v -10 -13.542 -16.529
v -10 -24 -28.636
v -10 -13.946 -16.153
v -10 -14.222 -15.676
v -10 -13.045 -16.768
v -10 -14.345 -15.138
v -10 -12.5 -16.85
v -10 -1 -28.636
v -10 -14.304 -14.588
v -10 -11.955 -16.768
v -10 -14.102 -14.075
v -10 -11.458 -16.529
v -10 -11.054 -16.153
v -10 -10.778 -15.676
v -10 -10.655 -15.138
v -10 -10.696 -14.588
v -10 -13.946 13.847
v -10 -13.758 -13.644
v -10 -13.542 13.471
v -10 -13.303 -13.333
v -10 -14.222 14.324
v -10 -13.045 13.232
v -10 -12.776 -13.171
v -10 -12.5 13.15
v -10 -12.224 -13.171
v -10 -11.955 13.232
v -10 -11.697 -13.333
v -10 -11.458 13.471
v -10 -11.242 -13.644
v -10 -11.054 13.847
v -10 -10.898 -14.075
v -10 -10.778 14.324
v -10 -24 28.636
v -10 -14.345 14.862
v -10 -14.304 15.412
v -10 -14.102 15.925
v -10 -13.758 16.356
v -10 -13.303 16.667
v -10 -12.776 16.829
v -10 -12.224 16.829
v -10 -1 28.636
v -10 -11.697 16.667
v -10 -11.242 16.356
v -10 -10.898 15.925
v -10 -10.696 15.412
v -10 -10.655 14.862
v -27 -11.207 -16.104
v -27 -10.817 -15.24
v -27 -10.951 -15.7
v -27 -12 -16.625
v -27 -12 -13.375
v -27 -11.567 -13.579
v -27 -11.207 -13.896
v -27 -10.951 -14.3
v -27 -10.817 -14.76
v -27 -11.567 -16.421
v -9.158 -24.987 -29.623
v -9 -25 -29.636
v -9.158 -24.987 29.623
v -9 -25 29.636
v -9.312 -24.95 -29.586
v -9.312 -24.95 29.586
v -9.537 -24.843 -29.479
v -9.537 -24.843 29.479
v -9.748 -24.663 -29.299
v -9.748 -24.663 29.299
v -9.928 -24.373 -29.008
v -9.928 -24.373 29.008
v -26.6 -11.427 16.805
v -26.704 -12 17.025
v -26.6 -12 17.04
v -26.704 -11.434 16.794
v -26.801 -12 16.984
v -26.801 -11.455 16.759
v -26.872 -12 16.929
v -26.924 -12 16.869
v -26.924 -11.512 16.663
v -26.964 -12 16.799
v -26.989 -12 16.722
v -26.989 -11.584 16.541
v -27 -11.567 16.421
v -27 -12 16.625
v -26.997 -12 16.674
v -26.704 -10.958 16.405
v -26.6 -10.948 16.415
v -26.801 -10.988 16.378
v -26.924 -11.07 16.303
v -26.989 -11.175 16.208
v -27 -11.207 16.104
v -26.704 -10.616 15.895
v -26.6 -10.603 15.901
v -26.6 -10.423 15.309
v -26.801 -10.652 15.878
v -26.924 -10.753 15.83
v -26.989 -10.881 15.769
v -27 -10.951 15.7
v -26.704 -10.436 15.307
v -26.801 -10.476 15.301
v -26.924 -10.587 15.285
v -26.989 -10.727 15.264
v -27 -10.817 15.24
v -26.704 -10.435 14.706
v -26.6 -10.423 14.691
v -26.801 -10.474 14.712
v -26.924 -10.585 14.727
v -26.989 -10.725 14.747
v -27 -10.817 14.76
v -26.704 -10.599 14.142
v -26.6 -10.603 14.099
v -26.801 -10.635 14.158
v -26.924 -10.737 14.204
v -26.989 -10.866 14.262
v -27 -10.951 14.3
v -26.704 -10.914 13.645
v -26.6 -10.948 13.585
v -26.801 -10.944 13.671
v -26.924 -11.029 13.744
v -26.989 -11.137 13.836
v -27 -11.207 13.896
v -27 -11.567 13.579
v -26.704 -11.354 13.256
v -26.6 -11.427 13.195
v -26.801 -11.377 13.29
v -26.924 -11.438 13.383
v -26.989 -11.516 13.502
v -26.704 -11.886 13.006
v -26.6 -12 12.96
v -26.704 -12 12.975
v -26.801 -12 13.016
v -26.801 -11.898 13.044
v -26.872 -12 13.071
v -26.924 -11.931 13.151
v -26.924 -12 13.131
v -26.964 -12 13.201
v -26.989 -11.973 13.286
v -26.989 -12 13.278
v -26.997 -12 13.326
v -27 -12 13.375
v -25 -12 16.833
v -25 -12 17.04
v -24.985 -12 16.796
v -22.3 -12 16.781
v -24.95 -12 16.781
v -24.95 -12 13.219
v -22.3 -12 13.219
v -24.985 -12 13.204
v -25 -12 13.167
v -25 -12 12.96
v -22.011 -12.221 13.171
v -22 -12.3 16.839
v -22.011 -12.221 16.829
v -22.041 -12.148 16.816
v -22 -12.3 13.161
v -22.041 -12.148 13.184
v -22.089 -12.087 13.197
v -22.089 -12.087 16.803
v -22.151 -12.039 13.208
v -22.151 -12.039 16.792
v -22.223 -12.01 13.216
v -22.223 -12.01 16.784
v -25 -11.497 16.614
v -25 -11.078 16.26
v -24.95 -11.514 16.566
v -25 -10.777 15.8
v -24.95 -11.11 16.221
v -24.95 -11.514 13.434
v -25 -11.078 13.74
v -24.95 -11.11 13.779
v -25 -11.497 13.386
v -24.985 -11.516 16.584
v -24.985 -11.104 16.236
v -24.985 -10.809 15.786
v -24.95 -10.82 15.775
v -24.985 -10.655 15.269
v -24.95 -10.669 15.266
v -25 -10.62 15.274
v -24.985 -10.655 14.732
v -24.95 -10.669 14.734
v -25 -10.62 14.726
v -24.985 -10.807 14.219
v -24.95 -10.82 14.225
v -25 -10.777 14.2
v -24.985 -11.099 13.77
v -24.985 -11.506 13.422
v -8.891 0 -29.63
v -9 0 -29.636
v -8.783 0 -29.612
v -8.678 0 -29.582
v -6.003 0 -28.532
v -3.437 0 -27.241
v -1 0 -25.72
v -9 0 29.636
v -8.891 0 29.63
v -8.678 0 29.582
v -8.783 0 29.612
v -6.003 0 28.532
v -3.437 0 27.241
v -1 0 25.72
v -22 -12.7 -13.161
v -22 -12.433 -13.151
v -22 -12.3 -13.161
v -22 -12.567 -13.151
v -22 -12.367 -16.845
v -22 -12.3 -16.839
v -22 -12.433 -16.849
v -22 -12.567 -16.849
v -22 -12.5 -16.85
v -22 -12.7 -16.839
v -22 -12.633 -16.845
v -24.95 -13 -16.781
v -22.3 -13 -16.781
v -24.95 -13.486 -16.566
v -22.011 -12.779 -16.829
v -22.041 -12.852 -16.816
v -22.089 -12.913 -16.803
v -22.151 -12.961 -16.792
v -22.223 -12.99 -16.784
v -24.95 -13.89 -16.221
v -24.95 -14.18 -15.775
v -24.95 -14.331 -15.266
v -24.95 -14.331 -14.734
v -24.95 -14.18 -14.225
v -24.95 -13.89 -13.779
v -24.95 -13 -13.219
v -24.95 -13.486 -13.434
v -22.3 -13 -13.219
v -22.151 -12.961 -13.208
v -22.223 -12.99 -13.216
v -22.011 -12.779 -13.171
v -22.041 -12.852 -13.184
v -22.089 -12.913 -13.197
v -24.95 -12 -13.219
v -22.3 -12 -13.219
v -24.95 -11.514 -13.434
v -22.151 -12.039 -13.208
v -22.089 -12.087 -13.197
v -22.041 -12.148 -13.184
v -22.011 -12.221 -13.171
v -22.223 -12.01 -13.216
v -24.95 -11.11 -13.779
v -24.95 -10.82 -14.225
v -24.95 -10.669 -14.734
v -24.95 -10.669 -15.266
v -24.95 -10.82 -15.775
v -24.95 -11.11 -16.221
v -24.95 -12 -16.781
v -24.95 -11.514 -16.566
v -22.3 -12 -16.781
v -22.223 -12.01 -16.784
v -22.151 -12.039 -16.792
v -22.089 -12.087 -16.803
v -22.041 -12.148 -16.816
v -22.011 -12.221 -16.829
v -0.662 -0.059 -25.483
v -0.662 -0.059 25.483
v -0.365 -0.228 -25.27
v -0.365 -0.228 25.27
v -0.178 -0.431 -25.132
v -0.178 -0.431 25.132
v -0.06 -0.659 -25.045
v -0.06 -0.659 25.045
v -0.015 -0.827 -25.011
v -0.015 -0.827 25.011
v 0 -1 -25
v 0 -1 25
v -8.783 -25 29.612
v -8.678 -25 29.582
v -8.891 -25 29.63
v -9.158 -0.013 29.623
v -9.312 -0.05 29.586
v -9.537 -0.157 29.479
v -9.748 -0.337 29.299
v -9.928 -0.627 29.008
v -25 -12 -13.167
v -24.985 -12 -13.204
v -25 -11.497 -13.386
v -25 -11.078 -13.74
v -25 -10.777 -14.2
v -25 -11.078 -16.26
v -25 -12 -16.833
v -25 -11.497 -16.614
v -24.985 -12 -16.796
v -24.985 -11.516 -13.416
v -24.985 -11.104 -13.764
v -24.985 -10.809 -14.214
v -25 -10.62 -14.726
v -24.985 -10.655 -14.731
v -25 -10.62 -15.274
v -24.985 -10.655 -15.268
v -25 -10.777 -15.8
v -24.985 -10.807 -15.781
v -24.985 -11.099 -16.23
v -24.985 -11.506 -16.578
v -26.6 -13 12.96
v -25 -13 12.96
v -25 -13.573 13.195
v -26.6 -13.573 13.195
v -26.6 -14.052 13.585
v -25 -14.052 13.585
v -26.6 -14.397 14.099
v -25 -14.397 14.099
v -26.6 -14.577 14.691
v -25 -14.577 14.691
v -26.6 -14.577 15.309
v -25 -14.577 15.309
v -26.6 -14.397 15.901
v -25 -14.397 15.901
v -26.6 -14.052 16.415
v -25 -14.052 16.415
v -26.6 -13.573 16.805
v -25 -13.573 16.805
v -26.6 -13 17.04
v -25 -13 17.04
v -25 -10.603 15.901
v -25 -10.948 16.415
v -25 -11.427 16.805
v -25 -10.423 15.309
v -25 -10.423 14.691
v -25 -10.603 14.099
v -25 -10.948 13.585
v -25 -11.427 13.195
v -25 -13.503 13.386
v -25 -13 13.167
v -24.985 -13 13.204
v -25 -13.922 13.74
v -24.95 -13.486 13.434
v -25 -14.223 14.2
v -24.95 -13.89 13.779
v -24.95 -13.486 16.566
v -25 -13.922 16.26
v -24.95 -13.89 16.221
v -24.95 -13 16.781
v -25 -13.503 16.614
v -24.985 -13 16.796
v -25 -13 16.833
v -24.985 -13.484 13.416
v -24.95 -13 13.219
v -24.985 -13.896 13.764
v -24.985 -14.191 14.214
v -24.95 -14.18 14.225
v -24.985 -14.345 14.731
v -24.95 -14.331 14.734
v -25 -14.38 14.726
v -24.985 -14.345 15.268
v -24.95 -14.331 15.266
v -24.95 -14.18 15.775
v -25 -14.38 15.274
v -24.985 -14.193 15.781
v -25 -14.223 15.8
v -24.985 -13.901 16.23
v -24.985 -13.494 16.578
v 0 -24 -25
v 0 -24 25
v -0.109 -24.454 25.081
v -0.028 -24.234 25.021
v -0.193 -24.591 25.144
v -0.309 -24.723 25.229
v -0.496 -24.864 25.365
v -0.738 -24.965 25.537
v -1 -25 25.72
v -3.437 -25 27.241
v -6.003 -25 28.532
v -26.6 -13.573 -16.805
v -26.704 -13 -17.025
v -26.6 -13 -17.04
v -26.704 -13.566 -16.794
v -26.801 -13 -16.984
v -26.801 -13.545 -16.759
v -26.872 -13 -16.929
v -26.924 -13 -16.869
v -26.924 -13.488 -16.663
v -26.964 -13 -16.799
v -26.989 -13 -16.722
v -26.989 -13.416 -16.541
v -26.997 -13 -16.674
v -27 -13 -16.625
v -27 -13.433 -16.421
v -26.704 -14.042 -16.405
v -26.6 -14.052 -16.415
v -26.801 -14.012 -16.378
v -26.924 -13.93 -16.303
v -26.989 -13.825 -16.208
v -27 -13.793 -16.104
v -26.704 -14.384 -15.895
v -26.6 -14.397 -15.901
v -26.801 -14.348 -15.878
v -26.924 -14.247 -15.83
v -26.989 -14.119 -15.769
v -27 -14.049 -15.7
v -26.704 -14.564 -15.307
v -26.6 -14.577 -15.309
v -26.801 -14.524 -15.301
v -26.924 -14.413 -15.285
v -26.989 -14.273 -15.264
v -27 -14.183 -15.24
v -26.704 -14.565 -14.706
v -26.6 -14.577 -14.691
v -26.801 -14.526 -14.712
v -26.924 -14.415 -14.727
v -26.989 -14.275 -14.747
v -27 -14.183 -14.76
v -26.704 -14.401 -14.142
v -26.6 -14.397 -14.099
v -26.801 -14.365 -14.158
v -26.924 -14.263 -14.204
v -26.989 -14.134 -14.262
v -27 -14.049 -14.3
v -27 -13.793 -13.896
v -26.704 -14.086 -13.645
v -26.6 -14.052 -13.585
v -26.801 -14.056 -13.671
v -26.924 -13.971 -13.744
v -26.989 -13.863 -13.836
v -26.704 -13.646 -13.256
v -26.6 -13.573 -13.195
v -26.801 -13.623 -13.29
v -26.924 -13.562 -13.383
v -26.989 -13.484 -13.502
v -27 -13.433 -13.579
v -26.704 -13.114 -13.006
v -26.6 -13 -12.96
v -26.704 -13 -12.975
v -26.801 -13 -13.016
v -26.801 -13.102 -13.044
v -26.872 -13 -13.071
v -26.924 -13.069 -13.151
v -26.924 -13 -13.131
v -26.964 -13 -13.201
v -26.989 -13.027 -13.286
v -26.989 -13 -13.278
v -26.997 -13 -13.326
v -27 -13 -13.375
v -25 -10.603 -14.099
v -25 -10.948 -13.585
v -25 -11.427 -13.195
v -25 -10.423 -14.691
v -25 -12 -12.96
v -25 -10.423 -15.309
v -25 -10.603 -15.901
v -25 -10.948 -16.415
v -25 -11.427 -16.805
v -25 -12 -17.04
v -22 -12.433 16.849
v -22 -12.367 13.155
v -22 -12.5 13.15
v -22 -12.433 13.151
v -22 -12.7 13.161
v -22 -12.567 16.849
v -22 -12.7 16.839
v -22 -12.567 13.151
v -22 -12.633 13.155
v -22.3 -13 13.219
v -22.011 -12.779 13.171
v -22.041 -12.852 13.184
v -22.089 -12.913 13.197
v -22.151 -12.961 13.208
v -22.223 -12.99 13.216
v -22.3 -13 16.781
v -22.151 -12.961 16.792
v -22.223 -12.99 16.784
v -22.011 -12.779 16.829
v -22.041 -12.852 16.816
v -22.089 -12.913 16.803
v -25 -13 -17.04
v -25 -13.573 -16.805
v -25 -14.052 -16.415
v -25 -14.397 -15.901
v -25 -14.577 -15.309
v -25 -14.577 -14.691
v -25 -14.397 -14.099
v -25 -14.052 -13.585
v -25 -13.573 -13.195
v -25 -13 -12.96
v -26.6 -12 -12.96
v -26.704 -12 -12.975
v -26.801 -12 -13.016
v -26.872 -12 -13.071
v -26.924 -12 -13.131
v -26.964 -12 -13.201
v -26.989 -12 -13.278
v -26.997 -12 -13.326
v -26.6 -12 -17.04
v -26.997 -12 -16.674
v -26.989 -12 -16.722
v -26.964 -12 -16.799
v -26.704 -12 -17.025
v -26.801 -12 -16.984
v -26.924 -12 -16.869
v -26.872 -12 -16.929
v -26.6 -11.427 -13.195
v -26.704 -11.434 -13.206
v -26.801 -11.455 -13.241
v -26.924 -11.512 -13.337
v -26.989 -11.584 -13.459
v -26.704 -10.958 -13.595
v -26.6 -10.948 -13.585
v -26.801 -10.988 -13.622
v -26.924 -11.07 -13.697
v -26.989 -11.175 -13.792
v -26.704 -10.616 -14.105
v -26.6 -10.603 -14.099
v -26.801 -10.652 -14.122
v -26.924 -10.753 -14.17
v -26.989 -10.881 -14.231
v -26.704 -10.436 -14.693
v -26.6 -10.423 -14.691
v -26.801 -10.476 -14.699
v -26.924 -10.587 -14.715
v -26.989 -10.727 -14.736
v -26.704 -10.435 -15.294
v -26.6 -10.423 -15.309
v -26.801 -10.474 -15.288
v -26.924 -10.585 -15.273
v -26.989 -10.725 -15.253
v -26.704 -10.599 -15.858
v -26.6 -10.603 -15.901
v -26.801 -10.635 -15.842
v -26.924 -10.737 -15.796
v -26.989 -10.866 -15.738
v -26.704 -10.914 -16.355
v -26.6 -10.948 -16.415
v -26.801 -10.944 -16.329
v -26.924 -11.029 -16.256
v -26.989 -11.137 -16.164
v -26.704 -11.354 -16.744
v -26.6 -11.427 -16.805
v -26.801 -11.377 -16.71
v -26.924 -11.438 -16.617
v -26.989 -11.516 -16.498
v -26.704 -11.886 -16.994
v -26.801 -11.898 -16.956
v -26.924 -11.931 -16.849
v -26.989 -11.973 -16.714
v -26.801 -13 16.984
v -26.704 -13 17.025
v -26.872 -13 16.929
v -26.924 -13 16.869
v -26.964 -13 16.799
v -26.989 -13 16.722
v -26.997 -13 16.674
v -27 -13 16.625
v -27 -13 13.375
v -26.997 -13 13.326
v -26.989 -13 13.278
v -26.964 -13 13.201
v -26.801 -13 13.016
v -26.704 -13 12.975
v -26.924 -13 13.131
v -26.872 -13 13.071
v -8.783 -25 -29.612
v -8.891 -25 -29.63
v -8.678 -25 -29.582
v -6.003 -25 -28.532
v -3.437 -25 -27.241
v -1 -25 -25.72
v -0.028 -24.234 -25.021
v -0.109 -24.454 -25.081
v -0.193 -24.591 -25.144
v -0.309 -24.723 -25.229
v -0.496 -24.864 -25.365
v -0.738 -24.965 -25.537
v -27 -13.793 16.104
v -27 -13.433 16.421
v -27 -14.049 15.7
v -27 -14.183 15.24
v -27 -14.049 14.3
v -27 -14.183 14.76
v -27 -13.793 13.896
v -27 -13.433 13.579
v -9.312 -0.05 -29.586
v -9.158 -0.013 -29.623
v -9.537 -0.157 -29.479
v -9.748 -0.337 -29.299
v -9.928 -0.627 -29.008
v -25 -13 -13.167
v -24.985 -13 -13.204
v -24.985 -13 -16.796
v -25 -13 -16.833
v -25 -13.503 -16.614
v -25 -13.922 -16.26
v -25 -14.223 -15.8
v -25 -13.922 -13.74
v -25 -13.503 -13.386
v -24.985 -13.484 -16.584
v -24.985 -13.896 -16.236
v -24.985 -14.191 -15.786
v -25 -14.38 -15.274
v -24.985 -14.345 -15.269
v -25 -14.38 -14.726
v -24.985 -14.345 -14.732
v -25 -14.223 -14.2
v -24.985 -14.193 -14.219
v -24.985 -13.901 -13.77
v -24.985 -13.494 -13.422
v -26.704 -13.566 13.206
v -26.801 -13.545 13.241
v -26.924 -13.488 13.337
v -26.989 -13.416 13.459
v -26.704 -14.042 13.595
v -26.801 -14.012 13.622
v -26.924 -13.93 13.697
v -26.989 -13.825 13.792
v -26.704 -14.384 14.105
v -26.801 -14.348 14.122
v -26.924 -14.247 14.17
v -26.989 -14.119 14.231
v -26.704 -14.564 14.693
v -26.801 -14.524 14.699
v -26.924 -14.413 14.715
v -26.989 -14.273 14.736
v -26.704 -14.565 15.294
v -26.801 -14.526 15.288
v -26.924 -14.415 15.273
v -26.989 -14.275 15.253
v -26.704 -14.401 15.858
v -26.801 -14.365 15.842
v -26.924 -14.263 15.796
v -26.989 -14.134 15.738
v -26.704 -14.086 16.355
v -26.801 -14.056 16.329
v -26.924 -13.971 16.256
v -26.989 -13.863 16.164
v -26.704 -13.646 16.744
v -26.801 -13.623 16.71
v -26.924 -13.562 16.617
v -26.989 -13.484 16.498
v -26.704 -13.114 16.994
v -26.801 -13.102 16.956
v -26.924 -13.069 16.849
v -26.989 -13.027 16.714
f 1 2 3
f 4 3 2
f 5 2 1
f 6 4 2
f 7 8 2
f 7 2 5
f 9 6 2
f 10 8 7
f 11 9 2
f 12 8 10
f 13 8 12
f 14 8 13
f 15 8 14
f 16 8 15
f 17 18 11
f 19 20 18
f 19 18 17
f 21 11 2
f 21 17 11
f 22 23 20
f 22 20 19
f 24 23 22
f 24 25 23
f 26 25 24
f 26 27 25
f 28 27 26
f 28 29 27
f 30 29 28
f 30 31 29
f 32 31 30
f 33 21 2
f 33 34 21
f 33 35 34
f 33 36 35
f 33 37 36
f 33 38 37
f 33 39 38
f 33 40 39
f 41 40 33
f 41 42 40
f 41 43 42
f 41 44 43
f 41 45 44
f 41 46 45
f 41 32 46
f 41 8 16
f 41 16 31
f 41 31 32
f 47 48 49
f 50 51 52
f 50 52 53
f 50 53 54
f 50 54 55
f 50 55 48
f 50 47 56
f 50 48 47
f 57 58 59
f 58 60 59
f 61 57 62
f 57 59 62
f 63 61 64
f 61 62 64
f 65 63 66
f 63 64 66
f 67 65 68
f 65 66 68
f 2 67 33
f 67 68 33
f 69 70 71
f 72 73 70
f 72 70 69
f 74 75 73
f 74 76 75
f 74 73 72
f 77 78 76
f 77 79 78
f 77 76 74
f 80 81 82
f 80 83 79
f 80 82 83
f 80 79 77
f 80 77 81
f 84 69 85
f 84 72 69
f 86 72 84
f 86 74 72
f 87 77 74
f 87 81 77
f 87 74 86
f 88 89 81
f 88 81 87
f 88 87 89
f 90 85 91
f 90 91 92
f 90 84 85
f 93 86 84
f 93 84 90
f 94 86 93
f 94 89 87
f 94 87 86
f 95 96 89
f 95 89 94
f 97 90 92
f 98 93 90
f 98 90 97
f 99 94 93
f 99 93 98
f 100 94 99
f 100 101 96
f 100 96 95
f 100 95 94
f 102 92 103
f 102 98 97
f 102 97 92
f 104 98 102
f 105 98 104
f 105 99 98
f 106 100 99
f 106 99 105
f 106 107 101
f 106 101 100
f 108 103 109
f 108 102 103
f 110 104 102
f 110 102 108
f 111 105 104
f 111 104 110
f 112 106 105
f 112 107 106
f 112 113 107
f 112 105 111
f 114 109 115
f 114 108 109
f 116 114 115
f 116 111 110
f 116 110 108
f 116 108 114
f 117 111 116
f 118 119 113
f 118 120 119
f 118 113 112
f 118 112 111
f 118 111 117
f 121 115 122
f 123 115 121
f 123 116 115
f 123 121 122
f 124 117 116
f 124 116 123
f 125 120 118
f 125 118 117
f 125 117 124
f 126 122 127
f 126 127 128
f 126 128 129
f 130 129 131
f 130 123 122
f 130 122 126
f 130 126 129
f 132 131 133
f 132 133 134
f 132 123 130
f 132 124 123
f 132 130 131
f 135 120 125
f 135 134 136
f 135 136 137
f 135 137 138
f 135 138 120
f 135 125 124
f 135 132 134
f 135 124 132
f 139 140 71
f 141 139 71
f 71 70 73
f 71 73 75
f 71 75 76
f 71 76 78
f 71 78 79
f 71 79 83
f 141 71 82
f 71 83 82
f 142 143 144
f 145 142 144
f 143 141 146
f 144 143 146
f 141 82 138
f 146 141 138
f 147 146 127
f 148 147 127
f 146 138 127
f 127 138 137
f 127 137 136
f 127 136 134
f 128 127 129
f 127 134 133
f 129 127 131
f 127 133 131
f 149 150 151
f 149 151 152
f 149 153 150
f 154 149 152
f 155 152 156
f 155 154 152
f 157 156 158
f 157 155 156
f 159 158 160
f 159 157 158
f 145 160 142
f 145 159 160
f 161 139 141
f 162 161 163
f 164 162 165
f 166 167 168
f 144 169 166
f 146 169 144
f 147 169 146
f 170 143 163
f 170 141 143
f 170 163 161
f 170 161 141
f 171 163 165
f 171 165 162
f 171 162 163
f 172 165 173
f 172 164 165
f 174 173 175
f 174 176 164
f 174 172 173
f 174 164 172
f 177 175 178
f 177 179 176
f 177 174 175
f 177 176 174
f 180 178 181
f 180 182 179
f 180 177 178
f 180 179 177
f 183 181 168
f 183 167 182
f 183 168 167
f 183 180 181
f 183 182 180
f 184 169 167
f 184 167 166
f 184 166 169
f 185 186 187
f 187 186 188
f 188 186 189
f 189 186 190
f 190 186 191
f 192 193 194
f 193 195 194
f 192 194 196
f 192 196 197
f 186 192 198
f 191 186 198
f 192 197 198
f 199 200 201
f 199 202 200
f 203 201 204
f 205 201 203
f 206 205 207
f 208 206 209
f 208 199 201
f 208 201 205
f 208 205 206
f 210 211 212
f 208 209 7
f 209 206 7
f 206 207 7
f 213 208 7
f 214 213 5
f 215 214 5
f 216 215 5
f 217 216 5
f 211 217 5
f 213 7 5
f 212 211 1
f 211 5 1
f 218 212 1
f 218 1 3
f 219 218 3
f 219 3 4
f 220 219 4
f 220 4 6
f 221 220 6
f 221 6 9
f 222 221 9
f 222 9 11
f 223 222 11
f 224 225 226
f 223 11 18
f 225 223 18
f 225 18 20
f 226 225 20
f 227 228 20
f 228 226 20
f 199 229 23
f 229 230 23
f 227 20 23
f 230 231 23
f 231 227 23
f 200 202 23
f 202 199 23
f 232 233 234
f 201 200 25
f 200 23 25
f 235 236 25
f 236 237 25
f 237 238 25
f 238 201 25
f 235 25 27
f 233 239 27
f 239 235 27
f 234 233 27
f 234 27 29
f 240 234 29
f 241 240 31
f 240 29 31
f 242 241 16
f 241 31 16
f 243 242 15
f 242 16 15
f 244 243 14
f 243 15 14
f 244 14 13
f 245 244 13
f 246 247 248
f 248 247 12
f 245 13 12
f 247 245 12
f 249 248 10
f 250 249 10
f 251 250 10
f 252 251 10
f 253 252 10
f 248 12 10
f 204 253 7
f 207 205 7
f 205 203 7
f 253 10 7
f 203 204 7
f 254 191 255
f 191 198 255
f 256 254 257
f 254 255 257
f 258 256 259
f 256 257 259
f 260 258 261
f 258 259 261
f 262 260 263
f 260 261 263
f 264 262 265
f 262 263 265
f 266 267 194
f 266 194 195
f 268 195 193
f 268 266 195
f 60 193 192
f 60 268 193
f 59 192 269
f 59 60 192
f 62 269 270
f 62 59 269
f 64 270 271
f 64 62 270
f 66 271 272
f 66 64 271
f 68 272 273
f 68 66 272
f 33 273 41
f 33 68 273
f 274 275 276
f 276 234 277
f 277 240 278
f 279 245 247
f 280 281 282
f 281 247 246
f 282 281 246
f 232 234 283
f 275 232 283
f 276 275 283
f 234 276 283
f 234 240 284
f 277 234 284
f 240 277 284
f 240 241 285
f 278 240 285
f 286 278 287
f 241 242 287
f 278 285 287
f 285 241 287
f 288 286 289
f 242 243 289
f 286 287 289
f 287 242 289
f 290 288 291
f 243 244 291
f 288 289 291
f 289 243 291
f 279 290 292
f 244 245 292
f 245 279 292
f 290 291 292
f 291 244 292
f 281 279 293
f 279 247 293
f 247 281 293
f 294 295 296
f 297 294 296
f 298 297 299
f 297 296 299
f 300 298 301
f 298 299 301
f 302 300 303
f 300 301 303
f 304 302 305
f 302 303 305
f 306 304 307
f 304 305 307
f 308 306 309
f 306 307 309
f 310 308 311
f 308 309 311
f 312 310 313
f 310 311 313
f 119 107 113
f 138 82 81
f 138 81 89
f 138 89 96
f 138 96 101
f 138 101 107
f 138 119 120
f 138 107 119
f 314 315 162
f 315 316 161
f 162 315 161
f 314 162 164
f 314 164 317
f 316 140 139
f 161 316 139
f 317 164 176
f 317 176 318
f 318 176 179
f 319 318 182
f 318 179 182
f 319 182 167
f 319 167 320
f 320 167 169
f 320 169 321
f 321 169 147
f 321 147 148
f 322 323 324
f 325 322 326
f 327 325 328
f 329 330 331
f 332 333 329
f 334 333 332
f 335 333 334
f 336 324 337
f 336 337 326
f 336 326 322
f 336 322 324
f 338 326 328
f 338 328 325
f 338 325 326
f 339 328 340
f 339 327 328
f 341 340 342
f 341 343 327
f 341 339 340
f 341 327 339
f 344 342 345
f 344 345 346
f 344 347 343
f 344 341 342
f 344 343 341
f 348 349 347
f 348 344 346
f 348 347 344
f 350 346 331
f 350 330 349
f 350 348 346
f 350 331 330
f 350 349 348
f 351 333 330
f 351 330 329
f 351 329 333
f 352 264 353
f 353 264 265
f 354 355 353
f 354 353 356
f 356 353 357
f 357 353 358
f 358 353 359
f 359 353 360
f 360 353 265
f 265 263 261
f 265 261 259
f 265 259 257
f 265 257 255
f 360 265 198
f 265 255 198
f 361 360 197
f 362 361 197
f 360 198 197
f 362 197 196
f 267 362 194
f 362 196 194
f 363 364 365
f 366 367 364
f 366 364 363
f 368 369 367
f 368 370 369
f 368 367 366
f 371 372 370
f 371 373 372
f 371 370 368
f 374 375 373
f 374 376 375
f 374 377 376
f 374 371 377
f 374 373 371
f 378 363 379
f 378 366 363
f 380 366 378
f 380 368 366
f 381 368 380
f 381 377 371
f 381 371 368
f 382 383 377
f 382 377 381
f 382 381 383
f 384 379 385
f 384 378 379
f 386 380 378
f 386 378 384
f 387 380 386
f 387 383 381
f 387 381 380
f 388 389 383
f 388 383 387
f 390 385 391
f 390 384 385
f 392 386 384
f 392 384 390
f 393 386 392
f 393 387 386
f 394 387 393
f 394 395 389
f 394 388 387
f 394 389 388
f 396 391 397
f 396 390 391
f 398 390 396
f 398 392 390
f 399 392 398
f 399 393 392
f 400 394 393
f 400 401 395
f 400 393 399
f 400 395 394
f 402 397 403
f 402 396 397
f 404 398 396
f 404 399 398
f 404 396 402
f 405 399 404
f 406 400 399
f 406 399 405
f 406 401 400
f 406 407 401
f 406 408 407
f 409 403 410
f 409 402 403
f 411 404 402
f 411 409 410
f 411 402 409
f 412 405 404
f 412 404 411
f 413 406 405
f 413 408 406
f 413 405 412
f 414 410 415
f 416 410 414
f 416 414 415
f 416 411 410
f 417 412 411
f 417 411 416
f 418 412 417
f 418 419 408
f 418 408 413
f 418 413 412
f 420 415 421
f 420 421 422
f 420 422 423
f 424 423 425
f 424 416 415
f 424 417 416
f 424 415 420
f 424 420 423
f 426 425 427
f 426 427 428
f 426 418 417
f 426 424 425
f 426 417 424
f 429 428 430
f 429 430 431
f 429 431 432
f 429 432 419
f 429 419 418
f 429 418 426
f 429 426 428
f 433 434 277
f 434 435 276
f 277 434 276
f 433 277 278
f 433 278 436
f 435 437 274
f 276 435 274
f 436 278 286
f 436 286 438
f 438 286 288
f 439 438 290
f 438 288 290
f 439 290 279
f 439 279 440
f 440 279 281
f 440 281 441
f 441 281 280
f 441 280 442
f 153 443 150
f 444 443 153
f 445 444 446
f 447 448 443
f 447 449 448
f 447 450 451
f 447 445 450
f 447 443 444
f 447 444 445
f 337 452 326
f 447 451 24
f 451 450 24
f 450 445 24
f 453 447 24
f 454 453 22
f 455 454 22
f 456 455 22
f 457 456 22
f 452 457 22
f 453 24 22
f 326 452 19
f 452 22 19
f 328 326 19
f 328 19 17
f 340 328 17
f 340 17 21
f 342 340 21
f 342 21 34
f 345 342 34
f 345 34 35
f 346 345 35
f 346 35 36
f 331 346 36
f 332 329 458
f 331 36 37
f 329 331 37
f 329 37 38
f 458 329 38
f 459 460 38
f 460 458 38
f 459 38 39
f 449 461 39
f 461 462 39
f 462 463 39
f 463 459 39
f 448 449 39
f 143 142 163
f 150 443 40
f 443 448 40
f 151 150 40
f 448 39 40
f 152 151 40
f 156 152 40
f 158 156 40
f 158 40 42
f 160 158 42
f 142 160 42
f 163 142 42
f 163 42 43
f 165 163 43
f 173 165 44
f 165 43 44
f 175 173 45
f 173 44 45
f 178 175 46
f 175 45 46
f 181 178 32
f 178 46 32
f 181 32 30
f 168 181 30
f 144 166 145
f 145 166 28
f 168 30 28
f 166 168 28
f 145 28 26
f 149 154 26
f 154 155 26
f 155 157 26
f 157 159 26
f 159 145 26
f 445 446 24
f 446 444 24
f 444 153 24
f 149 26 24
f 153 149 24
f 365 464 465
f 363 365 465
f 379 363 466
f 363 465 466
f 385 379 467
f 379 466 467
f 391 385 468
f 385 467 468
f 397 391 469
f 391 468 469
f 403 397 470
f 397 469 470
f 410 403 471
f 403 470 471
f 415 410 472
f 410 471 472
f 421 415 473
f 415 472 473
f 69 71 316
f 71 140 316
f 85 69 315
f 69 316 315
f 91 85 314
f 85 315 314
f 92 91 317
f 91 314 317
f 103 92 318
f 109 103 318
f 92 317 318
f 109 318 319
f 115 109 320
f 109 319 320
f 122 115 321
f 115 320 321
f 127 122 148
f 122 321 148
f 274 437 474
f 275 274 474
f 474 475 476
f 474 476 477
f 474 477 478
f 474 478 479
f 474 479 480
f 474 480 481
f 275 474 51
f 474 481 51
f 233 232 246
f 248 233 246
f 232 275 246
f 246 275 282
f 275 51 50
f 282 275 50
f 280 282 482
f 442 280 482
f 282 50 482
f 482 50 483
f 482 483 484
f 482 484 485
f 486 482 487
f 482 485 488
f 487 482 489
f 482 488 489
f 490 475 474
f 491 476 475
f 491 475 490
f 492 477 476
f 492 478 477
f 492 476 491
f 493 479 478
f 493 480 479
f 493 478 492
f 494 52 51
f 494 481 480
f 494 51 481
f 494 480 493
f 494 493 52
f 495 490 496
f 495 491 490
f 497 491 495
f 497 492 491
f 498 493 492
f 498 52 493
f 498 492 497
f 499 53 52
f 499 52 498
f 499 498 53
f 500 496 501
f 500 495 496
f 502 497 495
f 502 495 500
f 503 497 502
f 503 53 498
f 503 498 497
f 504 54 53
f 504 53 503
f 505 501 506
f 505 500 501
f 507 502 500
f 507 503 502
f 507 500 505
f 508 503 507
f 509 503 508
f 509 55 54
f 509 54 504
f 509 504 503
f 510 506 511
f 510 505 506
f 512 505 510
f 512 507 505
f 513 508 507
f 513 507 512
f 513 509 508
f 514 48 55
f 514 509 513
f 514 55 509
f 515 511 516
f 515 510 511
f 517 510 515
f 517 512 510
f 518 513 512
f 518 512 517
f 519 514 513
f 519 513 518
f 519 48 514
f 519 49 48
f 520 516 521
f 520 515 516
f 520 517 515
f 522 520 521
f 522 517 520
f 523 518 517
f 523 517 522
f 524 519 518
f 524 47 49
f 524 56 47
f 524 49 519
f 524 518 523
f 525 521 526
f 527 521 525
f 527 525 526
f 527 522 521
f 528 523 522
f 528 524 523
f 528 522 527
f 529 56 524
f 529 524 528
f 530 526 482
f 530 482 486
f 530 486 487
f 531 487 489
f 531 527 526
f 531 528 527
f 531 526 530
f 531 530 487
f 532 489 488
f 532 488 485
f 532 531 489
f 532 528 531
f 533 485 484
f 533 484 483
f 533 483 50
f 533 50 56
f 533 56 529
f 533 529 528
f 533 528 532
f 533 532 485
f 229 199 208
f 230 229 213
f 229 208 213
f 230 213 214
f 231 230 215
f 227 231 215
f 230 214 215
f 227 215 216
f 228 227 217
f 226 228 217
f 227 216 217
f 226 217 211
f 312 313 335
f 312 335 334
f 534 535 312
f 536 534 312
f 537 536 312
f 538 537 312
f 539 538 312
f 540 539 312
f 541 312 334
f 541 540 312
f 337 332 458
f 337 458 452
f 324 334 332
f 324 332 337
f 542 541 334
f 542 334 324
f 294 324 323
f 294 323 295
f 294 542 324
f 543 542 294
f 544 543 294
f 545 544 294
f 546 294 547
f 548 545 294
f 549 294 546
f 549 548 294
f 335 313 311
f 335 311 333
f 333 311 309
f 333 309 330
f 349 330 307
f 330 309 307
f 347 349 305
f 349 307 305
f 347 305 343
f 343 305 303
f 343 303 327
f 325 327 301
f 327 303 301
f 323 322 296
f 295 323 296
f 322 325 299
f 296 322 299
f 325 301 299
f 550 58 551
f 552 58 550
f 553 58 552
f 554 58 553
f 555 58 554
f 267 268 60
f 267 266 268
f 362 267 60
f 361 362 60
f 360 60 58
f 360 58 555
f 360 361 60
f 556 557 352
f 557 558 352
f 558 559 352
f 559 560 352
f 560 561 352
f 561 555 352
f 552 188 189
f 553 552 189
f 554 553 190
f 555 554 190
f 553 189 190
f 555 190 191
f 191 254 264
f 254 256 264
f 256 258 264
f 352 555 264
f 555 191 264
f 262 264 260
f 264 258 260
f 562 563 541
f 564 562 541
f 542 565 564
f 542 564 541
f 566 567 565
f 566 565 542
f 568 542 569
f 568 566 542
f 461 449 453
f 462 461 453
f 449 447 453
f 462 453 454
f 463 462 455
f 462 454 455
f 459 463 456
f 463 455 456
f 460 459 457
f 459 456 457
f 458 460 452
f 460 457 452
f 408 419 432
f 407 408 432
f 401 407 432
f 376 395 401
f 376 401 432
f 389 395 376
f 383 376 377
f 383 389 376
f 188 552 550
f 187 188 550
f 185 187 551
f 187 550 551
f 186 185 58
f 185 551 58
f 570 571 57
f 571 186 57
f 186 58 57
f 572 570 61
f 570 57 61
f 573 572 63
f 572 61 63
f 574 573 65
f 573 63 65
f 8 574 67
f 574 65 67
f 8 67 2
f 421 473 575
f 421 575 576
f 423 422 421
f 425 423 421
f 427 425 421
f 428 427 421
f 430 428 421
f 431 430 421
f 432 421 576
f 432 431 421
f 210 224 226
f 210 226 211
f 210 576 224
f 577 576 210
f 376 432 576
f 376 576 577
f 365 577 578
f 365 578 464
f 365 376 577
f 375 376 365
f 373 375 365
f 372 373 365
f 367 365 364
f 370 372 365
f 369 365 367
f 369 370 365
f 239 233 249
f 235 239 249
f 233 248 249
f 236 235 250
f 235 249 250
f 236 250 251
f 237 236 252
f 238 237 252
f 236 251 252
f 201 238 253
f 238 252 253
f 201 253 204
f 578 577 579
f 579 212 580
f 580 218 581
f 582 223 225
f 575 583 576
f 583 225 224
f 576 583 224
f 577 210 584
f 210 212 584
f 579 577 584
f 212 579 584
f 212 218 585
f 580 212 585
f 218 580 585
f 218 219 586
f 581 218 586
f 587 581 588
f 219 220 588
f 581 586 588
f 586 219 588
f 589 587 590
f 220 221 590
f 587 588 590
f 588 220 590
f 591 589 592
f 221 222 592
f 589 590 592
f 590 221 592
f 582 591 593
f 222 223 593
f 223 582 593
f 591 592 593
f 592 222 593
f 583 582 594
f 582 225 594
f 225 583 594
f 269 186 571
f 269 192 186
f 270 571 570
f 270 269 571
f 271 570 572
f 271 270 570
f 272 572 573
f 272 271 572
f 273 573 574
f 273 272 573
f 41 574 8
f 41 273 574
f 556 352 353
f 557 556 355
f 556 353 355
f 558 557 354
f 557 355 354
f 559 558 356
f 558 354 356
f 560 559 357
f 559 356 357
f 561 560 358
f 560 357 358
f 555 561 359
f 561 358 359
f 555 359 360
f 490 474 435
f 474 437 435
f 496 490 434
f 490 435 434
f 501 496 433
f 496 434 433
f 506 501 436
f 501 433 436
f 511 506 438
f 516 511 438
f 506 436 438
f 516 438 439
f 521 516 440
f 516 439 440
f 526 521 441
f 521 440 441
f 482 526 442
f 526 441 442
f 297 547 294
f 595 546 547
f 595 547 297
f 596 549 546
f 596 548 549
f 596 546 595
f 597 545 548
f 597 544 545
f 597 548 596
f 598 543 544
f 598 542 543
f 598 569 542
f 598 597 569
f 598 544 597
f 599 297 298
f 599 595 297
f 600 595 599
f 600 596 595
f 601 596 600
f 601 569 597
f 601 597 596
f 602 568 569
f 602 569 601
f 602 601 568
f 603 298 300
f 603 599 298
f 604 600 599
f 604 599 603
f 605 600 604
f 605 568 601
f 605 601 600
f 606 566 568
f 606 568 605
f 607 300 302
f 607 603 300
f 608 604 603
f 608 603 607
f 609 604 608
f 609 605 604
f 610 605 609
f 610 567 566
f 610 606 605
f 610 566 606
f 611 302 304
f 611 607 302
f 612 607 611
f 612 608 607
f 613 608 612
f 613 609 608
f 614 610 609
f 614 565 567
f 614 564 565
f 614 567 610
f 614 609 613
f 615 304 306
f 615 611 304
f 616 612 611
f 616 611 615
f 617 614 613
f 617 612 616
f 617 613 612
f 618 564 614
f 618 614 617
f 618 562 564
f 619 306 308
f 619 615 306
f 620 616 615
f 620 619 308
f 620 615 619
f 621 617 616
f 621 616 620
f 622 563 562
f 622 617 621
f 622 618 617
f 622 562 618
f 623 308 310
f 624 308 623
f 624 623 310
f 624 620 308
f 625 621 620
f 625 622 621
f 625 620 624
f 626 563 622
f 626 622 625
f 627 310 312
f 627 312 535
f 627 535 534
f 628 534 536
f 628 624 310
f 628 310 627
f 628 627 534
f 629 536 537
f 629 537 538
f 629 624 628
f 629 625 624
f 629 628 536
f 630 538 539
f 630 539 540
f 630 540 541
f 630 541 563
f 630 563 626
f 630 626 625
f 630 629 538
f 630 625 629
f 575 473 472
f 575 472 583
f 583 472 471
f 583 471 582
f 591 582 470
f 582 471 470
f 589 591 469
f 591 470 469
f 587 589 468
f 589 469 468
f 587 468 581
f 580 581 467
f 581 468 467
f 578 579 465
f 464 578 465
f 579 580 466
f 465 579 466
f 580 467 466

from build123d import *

# Parameters (mm, degrees)
PAD_DEPTH       = 25
SKETCH002_R     = 1.85
PAD002_DEPTH    = 15
FILLET_R        = 1
FILLET001_R     = 1
SKETCH004_R     = 2.1
PAD003_DEPTH    = 2
FILLET004_R     = 0.05
FILLET005_R     = 0.4
SKETCH007_W     = 37.33329
SKETCH007_H     = 1
POCKET002_DEPTH = 5
FILLET009_R     = 0.3


with BuildPart() as part:
    # Sketch → Pad (new body)
    with BuildSketch(Plane.XZ):
        with BuildLine():
            Line((0, -25), (0, 25))
            ThreePointArc((0, 25), (-4.774575, 27.95085), (-10, 30))
            Line((-10, -30), (-10, 30))
            ThreePointArc((-10, -30), (-4.774575, -27.95085), (0, -25))
        make_face()
    extrude(amount=PAD_DEPTH)

    # Sketch002 (on Face4 of Pad) → Pad002 (join)
    with BuildSketch(Plane(origin=(-10, 0, 0), x_dir=(0, 0, -1), z_dir=(-1, 0, 0))):
        with Locations((-15, 12.5)):
            Circle(SKETCH002_R)
        with Locations((15, 12.5)):
            Circle(SKETCH002_R)
    extrude(amount=PAD002_DEPTH)

    # Fillet
    fillet_edges = [part.edges().sort_by_distance(p)[0] for p in [
        (-10, -12.5, 30),
        (-10, -25, 0),
        (-10, 0, 0),
        (-10, -12.5, -30),
    ]]
    fillet(fillet_edges, radius=FILLET_R)

    # Fillet001
    fillet001_edges = [part.edges().sort_by_distance(p)[0] for p in [
        (0, 0, 0),
        (0, -25, 0),
    ]]
    fillet(fillet001_edges, radius=FILLET001_R)

    # Sketch004 (on Face16 of Fillet001) → Pad003 (join)
    with BuildSketch(Plane(origin=(-25, 0, 0), x_dir=(0, 0, -1), z_dir=(-1, 0, 0))):
        with Locations((15, 12.5)):
            Circle(SKETCH004_R)
        with Locations((-15, 12.5)):
            Circle(SKETCH004_R)
    extrude(amount=PAD003_DEPTH)

    # Fillet004
    fillet004_edges = [part.edges().sort_by_distance(p)[0] for p in [
        (-25, -12.5, -13.15),
        (-25, -12.5, 16.85),
    ]]
    fillet(fillet004_edges, radius=FILLET004_R)

    # Fillet005
    fillet005_edges = [part.edges().sort_by_distance(p)[0] for p in [
        (-27, -12.5, -12.9),
        (-27, -12.5, 17.1),
    ]]
    fillet(fillet005_edges, radius=FILLET005_R)

    # Sketch007 (on Face24 of Fillet005) → Pocket002 (cut)
    with BuildSketch(Plane(origin=(-27, 0, 0), x_dir=(0, 0, -1), z_dir=(-1, 0, 0))):
        with Locations((0.43578, 12.5)):
            Rectangle(SKETCH007_W, SKETCH007_H)
    extrude(amount=-POCKET002_DEPTH, mode=Mode.SUBTRACT)

    # Fillet009
    fillet009_edges = [part.edges().sort_by_distance(p)[0] for p in [
        (-22, -12, 15),
        (-22, -13, 15),
        (-22, -13, -15),
        (-22, -12, -15),
    ]]
    fillet(fillet009_edges, radius=FILLET009_R)


solid = part.part
